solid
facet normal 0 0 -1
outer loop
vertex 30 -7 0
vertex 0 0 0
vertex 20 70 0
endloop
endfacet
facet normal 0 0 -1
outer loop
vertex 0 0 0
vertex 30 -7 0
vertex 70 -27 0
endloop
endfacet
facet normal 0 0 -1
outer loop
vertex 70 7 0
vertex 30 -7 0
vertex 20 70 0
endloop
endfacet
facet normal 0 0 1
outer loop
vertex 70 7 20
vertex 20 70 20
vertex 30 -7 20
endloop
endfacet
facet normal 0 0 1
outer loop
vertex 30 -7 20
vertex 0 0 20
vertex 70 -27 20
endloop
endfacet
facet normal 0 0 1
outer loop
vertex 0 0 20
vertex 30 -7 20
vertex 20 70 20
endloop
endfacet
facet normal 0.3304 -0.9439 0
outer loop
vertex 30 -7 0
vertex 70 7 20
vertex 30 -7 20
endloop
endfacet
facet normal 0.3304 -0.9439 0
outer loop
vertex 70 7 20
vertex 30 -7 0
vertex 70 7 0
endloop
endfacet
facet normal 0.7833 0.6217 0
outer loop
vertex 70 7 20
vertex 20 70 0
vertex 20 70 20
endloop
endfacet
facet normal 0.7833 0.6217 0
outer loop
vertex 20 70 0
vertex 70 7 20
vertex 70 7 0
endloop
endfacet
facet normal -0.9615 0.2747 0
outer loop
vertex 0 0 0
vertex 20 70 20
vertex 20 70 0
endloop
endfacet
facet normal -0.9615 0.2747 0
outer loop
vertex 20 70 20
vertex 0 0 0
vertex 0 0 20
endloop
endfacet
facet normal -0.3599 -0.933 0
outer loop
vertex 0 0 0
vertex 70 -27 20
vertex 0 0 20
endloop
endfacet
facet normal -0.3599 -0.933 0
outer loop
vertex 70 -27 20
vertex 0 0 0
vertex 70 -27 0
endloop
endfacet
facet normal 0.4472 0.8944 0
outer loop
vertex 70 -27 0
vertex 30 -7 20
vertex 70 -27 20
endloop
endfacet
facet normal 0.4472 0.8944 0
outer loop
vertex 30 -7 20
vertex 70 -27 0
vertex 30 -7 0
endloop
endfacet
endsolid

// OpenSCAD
/// offset?
fn=20;

linear_extrude(height=30)
    RoundedPolygon([[0,0],[20,70],[70,7],[30.,-7],[70,-27]],-1,fn);
linear_extrude(height=20)
    RoundedPolygon([[0,0],[20,70],[70,7],[30.,-7],[70,-27]],0,fn);

linear_extrude(height=10)
    RoundedPolygon([[0,0],[20,70],[70,7],[30.,-7],[70,-27]],2,fn);

module RoundedPolygon(P,r,fn)
{
    v = rounded_polygon_v(P,r,fn);
    polygon(v);
}

function rounded_polygon_v(P,r,fn) =
let
(
    step = 360 / fn,
    n = len(P),
    o_v = [ for(i=[0:n-1]) atan2(P[(i+1)%n].y - P[i].y, P[(i+1)%n].x - P[i].x) + 90 + 360 ]
)
[ 
        for(i=[0:n-1])
            let 
            (
                n1 = i, 
                n2 = (i+1)%n,
                w1 = o_v[n1],
                w2 = (o_v[n2] < w1) ? o_v[n2] : o_v[n2] - 360,
            rm = (o_v[n2] < w1) ? 1: 1
)
            for (w=[w1:-step:w2]) 
                [ cos(w)*r*rm+P[n2][0], sin(w)*r*rm+P[n2][1] ] 
] ;
